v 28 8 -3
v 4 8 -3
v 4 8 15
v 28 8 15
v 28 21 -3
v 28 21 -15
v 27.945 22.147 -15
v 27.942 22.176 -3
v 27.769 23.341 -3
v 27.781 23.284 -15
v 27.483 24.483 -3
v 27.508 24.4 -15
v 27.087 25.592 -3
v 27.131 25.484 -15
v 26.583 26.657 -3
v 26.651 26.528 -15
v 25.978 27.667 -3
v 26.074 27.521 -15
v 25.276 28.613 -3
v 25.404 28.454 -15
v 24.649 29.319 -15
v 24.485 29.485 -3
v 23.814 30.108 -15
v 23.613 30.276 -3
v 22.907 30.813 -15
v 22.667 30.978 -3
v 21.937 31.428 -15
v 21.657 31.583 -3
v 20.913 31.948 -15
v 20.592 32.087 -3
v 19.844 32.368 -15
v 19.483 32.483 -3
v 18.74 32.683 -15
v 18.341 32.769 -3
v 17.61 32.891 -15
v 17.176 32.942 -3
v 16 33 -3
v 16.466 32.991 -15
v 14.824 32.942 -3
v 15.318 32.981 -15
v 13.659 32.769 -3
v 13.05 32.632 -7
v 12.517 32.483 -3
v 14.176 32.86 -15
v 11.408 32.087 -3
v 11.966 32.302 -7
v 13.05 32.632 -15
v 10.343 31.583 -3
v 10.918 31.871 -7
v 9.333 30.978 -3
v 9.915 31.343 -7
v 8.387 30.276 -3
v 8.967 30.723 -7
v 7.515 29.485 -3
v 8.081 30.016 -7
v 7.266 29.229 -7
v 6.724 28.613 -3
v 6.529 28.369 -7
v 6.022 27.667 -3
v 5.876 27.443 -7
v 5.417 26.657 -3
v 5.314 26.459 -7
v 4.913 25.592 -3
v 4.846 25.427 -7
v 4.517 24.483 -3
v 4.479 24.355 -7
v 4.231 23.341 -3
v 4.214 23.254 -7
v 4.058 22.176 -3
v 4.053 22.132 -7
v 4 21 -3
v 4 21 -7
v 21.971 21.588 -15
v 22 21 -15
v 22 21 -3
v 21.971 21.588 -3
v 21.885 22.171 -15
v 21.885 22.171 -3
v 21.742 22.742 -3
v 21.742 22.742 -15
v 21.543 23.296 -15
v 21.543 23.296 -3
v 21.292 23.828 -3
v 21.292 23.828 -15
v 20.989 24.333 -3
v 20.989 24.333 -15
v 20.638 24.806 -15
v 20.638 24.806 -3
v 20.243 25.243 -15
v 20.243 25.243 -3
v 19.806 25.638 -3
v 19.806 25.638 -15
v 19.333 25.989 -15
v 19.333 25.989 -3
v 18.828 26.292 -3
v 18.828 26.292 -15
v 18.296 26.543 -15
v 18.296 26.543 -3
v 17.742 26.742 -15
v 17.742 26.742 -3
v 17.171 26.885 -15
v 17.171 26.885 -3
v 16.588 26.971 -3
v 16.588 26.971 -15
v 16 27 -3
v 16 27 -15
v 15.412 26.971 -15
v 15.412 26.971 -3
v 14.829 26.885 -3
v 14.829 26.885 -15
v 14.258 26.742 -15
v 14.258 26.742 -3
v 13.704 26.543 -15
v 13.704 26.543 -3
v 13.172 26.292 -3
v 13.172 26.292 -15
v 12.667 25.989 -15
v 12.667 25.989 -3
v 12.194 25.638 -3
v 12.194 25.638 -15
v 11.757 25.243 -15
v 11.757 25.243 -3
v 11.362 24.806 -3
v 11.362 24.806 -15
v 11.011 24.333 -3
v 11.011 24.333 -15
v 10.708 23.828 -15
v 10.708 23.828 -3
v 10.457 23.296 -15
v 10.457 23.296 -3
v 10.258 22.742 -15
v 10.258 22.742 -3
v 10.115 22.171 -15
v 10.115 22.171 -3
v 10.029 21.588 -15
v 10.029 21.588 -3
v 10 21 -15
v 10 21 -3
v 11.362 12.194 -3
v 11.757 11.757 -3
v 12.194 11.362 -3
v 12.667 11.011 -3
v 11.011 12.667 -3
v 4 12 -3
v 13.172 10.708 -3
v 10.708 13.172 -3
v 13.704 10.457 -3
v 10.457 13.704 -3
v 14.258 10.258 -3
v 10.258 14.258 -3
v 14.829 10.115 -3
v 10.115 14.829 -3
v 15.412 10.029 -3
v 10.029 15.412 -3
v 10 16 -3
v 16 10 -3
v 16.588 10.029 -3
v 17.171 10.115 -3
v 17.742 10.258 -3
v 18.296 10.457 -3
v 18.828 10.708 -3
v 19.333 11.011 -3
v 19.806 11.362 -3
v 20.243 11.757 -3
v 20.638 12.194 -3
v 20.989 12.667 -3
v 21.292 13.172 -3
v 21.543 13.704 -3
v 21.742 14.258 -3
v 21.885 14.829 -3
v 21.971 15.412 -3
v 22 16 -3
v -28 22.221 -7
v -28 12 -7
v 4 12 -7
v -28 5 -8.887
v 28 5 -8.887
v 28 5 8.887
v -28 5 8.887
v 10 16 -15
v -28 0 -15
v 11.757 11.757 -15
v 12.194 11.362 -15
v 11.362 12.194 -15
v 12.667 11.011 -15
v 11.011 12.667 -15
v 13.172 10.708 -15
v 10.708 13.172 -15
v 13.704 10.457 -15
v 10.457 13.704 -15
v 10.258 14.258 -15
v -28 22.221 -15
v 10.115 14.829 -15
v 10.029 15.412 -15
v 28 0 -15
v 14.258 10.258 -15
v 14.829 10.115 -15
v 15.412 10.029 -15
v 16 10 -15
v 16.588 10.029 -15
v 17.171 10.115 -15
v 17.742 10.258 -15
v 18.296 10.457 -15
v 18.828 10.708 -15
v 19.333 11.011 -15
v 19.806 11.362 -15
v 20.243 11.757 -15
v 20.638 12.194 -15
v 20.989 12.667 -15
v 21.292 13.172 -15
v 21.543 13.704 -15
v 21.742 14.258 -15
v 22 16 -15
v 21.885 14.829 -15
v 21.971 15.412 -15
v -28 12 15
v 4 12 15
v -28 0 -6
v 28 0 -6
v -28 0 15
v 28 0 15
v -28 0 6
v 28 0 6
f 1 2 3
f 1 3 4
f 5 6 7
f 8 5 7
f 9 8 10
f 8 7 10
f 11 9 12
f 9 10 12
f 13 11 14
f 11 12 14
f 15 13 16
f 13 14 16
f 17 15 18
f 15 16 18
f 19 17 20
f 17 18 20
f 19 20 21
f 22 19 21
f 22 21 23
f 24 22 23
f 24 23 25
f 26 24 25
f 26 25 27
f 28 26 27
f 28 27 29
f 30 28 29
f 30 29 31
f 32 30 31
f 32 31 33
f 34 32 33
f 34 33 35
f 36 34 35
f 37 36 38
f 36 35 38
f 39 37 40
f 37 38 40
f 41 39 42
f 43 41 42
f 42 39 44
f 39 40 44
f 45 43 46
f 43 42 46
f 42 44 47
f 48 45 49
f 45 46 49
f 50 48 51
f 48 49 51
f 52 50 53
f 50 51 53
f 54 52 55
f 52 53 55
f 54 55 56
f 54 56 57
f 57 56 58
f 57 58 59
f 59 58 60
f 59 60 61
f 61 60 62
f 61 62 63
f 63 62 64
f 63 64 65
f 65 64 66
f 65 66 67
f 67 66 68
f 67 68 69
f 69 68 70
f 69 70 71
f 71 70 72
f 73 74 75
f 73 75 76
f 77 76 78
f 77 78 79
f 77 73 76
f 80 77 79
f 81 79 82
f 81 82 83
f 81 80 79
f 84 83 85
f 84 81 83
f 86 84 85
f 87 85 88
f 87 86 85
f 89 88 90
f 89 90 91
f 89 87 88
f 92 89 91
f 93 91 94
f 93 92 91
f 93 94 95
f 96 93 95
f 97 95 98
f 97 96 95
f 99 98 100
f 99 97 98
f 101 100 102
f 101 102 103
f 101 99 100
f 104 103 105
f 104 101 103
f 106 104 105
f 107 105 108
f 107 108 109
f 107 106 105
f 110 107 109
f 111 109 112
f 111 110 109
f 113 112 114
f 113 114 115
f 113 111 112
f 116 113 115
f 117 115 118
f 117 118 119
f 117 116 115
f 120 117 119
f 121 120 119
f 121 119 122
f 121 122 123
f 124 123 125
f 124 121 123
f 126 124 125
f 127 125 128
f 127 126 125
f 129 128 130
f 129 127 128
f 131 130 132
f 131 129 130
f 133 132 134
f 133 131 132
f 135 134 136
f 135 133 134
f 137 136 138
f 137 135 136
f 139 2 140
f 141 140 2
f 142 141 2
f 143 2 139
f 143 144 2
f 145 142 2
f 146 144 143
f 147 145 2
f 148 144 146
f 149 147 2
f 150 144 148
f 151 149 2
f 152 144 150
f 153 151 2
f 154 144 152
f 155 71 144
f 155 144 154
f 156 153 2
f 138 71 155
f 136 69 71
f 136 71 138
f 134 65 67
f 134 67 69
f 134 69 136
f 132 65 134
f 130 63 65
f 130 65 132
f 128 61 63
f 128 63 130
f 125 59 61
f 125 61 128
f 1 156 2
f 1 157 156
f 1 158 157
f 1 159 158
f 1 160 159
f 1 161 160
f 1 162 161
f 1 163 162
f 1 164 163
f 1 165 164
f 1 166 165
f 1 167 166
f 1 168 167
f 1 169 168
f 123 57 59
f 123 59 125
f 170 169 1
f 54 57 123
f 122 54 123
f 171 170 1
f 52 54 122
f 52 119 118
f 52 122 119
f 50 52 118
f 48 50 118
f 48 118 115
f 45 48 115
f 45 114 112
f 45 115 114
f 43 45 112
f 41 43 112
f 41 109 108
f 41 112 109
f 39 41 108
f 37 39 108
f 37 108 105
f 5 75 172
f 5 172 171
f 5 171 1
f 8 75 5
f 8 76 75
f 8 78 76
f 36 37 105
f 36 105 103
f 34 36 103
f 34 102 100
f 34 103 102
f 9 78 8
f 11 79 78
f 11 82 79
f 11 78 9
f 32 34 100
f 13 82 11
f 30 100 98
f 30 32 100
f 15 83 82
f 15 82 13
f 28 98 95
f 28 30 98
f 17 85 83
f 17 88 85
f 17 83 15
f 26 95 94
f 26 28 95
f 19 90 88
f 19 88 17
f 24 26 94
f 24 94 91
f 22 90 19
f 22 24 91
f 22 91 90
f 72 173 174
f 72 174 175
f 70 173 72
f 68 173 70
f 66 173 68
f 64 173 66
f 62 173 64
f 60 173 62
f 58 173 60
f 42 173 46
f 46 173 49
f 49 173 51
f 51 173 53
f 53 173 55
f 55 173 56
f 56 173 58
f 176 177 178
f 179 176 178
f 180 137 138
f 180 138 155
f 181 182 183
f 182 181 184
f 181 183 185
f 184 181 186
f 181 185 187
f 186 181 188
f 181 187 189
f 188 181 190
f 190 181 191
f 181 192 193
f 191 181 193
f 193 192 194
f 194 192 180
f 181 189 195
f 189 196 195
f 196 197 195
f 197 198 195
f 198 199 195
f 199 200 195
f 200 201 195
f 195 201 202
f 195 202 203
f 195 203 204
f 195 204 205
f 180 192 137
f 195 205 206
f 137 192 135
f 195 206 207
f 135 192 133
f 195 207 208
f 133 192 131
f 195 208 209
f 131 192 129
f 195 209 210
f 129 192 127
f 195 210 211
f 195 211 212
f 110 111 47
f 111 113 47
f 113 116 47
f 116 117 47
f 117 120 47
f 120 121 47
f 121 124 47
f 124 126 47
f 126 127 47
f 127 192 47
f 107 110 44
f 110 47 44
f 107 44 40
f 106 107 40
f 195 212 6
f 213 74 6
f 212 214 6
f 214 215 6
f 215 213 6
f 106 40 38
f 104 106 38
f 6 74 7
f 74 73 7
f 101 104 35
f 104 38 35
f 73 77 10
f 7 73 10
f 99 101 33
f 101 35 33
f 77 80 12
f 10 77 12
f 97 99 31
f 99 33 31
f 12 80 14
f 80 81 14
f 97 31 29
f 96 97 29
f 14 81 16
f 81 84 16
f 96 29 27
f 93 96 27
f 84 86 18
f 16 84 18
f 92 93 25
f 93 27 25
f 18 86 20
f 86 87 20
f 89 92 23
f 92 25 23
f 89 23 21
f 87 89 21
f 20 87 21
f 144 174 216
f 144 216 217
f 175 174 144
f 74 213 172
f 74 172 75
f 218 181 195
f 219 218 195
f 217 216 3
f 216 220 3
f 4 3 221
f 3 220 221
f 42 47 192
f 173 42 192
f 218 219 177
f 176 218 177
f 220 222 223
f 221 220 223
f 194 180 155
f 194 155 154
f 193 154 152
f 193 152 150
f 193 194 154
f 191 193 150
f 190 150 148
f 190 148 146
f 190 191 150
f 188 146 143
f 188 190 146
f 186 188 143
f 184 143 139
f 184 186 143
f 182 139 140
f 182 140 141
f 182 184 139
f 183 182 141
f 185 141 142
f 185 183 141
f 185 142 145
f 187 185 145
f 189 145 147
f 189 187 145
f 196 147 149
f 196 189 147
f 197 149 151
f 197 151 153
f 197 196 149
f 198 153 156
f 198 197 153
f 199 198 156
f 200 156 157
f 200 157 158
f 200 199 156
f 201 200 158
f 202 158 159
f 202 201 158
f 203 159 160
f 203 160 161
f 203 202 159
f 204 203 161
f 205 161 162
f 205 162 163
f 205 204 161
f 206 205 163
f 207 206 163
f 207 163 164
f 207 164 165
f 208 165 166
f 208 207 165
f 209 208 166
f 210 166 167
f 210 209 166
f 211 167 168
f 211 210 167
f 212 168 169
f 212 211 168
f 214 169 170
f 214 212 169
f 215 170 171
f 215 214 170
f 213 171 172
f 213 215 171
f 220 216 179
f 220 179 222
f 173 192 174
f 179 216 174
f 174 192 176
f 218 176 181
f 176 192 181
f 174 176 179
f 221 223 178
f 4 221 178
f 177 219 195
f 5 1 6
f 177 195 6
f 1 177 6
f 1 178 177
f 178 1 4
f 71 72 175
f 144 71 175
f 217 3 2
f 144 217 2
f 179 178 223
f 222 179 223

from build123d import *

# Parameters (mm, degrees)
SKETCH_1_W               = 56
SKETCH_1_H               = 30
EXTRUDE_1_DEPTH          = 8
SKETCH_3_W               = 32
SKETCH_3_H               = 30
EXTRUDE_2_DEPTH          = 4
EXTRUDE_3_DEPTH          = 12
EXTRUDE_4_DEPTH          = 8
CUT_EXTRUDE_1_DEPTH      = 46.803929962
CUT_EXTRUDE_1_DEPTH_BACK = 46.803929962


with BuildPart() as part:
    # 草图1 → 凸台-拉伸1 (new body)
    with BuildSketch(Plane(origin=(0, 0, 0), x_dir=(1, 0, 0), z_dir=(0, 1, 0))):
        Rectangle(SKETCH_1_W, SKETCH_1_H)
    extrude(amount=EXTRUDE_1_DEPTH)

    # 草图3 → 凸台-拉伸2 (add)
    with BuildSketch(Plane(origin=(0, 8, 0), x_dir=(1, 0, 0), z_dir=(0, 1, 0))):
        with Locations((-12, 0)):
            Rectangle(SKETCH_3_W, SKETCH_3_H)
    extrude(amount=EXTRUDE_2_DEPTH)

    # 草图7 → 凸台-拉伸3 (add)
    with BuildSketch(Plane.XY.offset(-15)):
        with BuildLine():
            Line((4, 21), (4, 12))
            Line((4, 12), (4, 8))
            Line((4, 8), (28, 8))
            Line((28, 8), (28, 21))
            ThreePointArc((28, 21), (23.368860948, 30.471002499), (13.050018612, 32.631750075))
            ThreePointArc((13.050018612, 32.631750075), (6.528997501, 28.368860948), (4, 21))
        make_face()
        with BuildLine():
            ThreePointArc((10, 21), (16, 27), (22, 21))
            Line((22, 21), (22, 16))
            ThreePointArc((22, 16), (16, 10), (10, 16))
            Line((10, 16), (10, 21))
        make_face(mode=Mode.SUBTRACT)
    extrude(amount=EXTRUDE_3_DEPTH)

    # 草图7<4> → 凸台-拉伸4 (add)
    with BuildSketch(Plane.XY.offset(-15)):
        with BuildLine():
            Line((-28, 22.220866923), (-28, 12))
            Line((-28, 12), (4, 12))
            Line((4, 12), (4, 21))
            ThreePointArc((4, 21), (6.528997501, 28.368860948), (13.050018612, 32.631750075))
            Line((13.050018612, 32.631750075), (-28, 22.220866923))
        make_face()
    extrude(amount=EXTRUDE_4_DEPTH)

    # 草图13 → 切除-拉伸1 (cut, two sides: drawn at the far end of the back side and taken through both)
    with BuildSketch(Plane(origin=(0, 0, 0), x_dir=(0, 0, -1), z_dir=(1, 0, 0)).offset(-CUT_EXTRUDE_1_DEPTH_BACK)):
        Polygon((-6, 0), (0, 0), (6, 0), (8.886751346, 5), (-8.886751346, 5), align=None)
    extrude(amount=CUT_EXTRUDE_1_DEPTH + CUT_EXTRUDE_1_DEPTH_BACK, mode=Mode.SUBTRACT)


solid = part.part
